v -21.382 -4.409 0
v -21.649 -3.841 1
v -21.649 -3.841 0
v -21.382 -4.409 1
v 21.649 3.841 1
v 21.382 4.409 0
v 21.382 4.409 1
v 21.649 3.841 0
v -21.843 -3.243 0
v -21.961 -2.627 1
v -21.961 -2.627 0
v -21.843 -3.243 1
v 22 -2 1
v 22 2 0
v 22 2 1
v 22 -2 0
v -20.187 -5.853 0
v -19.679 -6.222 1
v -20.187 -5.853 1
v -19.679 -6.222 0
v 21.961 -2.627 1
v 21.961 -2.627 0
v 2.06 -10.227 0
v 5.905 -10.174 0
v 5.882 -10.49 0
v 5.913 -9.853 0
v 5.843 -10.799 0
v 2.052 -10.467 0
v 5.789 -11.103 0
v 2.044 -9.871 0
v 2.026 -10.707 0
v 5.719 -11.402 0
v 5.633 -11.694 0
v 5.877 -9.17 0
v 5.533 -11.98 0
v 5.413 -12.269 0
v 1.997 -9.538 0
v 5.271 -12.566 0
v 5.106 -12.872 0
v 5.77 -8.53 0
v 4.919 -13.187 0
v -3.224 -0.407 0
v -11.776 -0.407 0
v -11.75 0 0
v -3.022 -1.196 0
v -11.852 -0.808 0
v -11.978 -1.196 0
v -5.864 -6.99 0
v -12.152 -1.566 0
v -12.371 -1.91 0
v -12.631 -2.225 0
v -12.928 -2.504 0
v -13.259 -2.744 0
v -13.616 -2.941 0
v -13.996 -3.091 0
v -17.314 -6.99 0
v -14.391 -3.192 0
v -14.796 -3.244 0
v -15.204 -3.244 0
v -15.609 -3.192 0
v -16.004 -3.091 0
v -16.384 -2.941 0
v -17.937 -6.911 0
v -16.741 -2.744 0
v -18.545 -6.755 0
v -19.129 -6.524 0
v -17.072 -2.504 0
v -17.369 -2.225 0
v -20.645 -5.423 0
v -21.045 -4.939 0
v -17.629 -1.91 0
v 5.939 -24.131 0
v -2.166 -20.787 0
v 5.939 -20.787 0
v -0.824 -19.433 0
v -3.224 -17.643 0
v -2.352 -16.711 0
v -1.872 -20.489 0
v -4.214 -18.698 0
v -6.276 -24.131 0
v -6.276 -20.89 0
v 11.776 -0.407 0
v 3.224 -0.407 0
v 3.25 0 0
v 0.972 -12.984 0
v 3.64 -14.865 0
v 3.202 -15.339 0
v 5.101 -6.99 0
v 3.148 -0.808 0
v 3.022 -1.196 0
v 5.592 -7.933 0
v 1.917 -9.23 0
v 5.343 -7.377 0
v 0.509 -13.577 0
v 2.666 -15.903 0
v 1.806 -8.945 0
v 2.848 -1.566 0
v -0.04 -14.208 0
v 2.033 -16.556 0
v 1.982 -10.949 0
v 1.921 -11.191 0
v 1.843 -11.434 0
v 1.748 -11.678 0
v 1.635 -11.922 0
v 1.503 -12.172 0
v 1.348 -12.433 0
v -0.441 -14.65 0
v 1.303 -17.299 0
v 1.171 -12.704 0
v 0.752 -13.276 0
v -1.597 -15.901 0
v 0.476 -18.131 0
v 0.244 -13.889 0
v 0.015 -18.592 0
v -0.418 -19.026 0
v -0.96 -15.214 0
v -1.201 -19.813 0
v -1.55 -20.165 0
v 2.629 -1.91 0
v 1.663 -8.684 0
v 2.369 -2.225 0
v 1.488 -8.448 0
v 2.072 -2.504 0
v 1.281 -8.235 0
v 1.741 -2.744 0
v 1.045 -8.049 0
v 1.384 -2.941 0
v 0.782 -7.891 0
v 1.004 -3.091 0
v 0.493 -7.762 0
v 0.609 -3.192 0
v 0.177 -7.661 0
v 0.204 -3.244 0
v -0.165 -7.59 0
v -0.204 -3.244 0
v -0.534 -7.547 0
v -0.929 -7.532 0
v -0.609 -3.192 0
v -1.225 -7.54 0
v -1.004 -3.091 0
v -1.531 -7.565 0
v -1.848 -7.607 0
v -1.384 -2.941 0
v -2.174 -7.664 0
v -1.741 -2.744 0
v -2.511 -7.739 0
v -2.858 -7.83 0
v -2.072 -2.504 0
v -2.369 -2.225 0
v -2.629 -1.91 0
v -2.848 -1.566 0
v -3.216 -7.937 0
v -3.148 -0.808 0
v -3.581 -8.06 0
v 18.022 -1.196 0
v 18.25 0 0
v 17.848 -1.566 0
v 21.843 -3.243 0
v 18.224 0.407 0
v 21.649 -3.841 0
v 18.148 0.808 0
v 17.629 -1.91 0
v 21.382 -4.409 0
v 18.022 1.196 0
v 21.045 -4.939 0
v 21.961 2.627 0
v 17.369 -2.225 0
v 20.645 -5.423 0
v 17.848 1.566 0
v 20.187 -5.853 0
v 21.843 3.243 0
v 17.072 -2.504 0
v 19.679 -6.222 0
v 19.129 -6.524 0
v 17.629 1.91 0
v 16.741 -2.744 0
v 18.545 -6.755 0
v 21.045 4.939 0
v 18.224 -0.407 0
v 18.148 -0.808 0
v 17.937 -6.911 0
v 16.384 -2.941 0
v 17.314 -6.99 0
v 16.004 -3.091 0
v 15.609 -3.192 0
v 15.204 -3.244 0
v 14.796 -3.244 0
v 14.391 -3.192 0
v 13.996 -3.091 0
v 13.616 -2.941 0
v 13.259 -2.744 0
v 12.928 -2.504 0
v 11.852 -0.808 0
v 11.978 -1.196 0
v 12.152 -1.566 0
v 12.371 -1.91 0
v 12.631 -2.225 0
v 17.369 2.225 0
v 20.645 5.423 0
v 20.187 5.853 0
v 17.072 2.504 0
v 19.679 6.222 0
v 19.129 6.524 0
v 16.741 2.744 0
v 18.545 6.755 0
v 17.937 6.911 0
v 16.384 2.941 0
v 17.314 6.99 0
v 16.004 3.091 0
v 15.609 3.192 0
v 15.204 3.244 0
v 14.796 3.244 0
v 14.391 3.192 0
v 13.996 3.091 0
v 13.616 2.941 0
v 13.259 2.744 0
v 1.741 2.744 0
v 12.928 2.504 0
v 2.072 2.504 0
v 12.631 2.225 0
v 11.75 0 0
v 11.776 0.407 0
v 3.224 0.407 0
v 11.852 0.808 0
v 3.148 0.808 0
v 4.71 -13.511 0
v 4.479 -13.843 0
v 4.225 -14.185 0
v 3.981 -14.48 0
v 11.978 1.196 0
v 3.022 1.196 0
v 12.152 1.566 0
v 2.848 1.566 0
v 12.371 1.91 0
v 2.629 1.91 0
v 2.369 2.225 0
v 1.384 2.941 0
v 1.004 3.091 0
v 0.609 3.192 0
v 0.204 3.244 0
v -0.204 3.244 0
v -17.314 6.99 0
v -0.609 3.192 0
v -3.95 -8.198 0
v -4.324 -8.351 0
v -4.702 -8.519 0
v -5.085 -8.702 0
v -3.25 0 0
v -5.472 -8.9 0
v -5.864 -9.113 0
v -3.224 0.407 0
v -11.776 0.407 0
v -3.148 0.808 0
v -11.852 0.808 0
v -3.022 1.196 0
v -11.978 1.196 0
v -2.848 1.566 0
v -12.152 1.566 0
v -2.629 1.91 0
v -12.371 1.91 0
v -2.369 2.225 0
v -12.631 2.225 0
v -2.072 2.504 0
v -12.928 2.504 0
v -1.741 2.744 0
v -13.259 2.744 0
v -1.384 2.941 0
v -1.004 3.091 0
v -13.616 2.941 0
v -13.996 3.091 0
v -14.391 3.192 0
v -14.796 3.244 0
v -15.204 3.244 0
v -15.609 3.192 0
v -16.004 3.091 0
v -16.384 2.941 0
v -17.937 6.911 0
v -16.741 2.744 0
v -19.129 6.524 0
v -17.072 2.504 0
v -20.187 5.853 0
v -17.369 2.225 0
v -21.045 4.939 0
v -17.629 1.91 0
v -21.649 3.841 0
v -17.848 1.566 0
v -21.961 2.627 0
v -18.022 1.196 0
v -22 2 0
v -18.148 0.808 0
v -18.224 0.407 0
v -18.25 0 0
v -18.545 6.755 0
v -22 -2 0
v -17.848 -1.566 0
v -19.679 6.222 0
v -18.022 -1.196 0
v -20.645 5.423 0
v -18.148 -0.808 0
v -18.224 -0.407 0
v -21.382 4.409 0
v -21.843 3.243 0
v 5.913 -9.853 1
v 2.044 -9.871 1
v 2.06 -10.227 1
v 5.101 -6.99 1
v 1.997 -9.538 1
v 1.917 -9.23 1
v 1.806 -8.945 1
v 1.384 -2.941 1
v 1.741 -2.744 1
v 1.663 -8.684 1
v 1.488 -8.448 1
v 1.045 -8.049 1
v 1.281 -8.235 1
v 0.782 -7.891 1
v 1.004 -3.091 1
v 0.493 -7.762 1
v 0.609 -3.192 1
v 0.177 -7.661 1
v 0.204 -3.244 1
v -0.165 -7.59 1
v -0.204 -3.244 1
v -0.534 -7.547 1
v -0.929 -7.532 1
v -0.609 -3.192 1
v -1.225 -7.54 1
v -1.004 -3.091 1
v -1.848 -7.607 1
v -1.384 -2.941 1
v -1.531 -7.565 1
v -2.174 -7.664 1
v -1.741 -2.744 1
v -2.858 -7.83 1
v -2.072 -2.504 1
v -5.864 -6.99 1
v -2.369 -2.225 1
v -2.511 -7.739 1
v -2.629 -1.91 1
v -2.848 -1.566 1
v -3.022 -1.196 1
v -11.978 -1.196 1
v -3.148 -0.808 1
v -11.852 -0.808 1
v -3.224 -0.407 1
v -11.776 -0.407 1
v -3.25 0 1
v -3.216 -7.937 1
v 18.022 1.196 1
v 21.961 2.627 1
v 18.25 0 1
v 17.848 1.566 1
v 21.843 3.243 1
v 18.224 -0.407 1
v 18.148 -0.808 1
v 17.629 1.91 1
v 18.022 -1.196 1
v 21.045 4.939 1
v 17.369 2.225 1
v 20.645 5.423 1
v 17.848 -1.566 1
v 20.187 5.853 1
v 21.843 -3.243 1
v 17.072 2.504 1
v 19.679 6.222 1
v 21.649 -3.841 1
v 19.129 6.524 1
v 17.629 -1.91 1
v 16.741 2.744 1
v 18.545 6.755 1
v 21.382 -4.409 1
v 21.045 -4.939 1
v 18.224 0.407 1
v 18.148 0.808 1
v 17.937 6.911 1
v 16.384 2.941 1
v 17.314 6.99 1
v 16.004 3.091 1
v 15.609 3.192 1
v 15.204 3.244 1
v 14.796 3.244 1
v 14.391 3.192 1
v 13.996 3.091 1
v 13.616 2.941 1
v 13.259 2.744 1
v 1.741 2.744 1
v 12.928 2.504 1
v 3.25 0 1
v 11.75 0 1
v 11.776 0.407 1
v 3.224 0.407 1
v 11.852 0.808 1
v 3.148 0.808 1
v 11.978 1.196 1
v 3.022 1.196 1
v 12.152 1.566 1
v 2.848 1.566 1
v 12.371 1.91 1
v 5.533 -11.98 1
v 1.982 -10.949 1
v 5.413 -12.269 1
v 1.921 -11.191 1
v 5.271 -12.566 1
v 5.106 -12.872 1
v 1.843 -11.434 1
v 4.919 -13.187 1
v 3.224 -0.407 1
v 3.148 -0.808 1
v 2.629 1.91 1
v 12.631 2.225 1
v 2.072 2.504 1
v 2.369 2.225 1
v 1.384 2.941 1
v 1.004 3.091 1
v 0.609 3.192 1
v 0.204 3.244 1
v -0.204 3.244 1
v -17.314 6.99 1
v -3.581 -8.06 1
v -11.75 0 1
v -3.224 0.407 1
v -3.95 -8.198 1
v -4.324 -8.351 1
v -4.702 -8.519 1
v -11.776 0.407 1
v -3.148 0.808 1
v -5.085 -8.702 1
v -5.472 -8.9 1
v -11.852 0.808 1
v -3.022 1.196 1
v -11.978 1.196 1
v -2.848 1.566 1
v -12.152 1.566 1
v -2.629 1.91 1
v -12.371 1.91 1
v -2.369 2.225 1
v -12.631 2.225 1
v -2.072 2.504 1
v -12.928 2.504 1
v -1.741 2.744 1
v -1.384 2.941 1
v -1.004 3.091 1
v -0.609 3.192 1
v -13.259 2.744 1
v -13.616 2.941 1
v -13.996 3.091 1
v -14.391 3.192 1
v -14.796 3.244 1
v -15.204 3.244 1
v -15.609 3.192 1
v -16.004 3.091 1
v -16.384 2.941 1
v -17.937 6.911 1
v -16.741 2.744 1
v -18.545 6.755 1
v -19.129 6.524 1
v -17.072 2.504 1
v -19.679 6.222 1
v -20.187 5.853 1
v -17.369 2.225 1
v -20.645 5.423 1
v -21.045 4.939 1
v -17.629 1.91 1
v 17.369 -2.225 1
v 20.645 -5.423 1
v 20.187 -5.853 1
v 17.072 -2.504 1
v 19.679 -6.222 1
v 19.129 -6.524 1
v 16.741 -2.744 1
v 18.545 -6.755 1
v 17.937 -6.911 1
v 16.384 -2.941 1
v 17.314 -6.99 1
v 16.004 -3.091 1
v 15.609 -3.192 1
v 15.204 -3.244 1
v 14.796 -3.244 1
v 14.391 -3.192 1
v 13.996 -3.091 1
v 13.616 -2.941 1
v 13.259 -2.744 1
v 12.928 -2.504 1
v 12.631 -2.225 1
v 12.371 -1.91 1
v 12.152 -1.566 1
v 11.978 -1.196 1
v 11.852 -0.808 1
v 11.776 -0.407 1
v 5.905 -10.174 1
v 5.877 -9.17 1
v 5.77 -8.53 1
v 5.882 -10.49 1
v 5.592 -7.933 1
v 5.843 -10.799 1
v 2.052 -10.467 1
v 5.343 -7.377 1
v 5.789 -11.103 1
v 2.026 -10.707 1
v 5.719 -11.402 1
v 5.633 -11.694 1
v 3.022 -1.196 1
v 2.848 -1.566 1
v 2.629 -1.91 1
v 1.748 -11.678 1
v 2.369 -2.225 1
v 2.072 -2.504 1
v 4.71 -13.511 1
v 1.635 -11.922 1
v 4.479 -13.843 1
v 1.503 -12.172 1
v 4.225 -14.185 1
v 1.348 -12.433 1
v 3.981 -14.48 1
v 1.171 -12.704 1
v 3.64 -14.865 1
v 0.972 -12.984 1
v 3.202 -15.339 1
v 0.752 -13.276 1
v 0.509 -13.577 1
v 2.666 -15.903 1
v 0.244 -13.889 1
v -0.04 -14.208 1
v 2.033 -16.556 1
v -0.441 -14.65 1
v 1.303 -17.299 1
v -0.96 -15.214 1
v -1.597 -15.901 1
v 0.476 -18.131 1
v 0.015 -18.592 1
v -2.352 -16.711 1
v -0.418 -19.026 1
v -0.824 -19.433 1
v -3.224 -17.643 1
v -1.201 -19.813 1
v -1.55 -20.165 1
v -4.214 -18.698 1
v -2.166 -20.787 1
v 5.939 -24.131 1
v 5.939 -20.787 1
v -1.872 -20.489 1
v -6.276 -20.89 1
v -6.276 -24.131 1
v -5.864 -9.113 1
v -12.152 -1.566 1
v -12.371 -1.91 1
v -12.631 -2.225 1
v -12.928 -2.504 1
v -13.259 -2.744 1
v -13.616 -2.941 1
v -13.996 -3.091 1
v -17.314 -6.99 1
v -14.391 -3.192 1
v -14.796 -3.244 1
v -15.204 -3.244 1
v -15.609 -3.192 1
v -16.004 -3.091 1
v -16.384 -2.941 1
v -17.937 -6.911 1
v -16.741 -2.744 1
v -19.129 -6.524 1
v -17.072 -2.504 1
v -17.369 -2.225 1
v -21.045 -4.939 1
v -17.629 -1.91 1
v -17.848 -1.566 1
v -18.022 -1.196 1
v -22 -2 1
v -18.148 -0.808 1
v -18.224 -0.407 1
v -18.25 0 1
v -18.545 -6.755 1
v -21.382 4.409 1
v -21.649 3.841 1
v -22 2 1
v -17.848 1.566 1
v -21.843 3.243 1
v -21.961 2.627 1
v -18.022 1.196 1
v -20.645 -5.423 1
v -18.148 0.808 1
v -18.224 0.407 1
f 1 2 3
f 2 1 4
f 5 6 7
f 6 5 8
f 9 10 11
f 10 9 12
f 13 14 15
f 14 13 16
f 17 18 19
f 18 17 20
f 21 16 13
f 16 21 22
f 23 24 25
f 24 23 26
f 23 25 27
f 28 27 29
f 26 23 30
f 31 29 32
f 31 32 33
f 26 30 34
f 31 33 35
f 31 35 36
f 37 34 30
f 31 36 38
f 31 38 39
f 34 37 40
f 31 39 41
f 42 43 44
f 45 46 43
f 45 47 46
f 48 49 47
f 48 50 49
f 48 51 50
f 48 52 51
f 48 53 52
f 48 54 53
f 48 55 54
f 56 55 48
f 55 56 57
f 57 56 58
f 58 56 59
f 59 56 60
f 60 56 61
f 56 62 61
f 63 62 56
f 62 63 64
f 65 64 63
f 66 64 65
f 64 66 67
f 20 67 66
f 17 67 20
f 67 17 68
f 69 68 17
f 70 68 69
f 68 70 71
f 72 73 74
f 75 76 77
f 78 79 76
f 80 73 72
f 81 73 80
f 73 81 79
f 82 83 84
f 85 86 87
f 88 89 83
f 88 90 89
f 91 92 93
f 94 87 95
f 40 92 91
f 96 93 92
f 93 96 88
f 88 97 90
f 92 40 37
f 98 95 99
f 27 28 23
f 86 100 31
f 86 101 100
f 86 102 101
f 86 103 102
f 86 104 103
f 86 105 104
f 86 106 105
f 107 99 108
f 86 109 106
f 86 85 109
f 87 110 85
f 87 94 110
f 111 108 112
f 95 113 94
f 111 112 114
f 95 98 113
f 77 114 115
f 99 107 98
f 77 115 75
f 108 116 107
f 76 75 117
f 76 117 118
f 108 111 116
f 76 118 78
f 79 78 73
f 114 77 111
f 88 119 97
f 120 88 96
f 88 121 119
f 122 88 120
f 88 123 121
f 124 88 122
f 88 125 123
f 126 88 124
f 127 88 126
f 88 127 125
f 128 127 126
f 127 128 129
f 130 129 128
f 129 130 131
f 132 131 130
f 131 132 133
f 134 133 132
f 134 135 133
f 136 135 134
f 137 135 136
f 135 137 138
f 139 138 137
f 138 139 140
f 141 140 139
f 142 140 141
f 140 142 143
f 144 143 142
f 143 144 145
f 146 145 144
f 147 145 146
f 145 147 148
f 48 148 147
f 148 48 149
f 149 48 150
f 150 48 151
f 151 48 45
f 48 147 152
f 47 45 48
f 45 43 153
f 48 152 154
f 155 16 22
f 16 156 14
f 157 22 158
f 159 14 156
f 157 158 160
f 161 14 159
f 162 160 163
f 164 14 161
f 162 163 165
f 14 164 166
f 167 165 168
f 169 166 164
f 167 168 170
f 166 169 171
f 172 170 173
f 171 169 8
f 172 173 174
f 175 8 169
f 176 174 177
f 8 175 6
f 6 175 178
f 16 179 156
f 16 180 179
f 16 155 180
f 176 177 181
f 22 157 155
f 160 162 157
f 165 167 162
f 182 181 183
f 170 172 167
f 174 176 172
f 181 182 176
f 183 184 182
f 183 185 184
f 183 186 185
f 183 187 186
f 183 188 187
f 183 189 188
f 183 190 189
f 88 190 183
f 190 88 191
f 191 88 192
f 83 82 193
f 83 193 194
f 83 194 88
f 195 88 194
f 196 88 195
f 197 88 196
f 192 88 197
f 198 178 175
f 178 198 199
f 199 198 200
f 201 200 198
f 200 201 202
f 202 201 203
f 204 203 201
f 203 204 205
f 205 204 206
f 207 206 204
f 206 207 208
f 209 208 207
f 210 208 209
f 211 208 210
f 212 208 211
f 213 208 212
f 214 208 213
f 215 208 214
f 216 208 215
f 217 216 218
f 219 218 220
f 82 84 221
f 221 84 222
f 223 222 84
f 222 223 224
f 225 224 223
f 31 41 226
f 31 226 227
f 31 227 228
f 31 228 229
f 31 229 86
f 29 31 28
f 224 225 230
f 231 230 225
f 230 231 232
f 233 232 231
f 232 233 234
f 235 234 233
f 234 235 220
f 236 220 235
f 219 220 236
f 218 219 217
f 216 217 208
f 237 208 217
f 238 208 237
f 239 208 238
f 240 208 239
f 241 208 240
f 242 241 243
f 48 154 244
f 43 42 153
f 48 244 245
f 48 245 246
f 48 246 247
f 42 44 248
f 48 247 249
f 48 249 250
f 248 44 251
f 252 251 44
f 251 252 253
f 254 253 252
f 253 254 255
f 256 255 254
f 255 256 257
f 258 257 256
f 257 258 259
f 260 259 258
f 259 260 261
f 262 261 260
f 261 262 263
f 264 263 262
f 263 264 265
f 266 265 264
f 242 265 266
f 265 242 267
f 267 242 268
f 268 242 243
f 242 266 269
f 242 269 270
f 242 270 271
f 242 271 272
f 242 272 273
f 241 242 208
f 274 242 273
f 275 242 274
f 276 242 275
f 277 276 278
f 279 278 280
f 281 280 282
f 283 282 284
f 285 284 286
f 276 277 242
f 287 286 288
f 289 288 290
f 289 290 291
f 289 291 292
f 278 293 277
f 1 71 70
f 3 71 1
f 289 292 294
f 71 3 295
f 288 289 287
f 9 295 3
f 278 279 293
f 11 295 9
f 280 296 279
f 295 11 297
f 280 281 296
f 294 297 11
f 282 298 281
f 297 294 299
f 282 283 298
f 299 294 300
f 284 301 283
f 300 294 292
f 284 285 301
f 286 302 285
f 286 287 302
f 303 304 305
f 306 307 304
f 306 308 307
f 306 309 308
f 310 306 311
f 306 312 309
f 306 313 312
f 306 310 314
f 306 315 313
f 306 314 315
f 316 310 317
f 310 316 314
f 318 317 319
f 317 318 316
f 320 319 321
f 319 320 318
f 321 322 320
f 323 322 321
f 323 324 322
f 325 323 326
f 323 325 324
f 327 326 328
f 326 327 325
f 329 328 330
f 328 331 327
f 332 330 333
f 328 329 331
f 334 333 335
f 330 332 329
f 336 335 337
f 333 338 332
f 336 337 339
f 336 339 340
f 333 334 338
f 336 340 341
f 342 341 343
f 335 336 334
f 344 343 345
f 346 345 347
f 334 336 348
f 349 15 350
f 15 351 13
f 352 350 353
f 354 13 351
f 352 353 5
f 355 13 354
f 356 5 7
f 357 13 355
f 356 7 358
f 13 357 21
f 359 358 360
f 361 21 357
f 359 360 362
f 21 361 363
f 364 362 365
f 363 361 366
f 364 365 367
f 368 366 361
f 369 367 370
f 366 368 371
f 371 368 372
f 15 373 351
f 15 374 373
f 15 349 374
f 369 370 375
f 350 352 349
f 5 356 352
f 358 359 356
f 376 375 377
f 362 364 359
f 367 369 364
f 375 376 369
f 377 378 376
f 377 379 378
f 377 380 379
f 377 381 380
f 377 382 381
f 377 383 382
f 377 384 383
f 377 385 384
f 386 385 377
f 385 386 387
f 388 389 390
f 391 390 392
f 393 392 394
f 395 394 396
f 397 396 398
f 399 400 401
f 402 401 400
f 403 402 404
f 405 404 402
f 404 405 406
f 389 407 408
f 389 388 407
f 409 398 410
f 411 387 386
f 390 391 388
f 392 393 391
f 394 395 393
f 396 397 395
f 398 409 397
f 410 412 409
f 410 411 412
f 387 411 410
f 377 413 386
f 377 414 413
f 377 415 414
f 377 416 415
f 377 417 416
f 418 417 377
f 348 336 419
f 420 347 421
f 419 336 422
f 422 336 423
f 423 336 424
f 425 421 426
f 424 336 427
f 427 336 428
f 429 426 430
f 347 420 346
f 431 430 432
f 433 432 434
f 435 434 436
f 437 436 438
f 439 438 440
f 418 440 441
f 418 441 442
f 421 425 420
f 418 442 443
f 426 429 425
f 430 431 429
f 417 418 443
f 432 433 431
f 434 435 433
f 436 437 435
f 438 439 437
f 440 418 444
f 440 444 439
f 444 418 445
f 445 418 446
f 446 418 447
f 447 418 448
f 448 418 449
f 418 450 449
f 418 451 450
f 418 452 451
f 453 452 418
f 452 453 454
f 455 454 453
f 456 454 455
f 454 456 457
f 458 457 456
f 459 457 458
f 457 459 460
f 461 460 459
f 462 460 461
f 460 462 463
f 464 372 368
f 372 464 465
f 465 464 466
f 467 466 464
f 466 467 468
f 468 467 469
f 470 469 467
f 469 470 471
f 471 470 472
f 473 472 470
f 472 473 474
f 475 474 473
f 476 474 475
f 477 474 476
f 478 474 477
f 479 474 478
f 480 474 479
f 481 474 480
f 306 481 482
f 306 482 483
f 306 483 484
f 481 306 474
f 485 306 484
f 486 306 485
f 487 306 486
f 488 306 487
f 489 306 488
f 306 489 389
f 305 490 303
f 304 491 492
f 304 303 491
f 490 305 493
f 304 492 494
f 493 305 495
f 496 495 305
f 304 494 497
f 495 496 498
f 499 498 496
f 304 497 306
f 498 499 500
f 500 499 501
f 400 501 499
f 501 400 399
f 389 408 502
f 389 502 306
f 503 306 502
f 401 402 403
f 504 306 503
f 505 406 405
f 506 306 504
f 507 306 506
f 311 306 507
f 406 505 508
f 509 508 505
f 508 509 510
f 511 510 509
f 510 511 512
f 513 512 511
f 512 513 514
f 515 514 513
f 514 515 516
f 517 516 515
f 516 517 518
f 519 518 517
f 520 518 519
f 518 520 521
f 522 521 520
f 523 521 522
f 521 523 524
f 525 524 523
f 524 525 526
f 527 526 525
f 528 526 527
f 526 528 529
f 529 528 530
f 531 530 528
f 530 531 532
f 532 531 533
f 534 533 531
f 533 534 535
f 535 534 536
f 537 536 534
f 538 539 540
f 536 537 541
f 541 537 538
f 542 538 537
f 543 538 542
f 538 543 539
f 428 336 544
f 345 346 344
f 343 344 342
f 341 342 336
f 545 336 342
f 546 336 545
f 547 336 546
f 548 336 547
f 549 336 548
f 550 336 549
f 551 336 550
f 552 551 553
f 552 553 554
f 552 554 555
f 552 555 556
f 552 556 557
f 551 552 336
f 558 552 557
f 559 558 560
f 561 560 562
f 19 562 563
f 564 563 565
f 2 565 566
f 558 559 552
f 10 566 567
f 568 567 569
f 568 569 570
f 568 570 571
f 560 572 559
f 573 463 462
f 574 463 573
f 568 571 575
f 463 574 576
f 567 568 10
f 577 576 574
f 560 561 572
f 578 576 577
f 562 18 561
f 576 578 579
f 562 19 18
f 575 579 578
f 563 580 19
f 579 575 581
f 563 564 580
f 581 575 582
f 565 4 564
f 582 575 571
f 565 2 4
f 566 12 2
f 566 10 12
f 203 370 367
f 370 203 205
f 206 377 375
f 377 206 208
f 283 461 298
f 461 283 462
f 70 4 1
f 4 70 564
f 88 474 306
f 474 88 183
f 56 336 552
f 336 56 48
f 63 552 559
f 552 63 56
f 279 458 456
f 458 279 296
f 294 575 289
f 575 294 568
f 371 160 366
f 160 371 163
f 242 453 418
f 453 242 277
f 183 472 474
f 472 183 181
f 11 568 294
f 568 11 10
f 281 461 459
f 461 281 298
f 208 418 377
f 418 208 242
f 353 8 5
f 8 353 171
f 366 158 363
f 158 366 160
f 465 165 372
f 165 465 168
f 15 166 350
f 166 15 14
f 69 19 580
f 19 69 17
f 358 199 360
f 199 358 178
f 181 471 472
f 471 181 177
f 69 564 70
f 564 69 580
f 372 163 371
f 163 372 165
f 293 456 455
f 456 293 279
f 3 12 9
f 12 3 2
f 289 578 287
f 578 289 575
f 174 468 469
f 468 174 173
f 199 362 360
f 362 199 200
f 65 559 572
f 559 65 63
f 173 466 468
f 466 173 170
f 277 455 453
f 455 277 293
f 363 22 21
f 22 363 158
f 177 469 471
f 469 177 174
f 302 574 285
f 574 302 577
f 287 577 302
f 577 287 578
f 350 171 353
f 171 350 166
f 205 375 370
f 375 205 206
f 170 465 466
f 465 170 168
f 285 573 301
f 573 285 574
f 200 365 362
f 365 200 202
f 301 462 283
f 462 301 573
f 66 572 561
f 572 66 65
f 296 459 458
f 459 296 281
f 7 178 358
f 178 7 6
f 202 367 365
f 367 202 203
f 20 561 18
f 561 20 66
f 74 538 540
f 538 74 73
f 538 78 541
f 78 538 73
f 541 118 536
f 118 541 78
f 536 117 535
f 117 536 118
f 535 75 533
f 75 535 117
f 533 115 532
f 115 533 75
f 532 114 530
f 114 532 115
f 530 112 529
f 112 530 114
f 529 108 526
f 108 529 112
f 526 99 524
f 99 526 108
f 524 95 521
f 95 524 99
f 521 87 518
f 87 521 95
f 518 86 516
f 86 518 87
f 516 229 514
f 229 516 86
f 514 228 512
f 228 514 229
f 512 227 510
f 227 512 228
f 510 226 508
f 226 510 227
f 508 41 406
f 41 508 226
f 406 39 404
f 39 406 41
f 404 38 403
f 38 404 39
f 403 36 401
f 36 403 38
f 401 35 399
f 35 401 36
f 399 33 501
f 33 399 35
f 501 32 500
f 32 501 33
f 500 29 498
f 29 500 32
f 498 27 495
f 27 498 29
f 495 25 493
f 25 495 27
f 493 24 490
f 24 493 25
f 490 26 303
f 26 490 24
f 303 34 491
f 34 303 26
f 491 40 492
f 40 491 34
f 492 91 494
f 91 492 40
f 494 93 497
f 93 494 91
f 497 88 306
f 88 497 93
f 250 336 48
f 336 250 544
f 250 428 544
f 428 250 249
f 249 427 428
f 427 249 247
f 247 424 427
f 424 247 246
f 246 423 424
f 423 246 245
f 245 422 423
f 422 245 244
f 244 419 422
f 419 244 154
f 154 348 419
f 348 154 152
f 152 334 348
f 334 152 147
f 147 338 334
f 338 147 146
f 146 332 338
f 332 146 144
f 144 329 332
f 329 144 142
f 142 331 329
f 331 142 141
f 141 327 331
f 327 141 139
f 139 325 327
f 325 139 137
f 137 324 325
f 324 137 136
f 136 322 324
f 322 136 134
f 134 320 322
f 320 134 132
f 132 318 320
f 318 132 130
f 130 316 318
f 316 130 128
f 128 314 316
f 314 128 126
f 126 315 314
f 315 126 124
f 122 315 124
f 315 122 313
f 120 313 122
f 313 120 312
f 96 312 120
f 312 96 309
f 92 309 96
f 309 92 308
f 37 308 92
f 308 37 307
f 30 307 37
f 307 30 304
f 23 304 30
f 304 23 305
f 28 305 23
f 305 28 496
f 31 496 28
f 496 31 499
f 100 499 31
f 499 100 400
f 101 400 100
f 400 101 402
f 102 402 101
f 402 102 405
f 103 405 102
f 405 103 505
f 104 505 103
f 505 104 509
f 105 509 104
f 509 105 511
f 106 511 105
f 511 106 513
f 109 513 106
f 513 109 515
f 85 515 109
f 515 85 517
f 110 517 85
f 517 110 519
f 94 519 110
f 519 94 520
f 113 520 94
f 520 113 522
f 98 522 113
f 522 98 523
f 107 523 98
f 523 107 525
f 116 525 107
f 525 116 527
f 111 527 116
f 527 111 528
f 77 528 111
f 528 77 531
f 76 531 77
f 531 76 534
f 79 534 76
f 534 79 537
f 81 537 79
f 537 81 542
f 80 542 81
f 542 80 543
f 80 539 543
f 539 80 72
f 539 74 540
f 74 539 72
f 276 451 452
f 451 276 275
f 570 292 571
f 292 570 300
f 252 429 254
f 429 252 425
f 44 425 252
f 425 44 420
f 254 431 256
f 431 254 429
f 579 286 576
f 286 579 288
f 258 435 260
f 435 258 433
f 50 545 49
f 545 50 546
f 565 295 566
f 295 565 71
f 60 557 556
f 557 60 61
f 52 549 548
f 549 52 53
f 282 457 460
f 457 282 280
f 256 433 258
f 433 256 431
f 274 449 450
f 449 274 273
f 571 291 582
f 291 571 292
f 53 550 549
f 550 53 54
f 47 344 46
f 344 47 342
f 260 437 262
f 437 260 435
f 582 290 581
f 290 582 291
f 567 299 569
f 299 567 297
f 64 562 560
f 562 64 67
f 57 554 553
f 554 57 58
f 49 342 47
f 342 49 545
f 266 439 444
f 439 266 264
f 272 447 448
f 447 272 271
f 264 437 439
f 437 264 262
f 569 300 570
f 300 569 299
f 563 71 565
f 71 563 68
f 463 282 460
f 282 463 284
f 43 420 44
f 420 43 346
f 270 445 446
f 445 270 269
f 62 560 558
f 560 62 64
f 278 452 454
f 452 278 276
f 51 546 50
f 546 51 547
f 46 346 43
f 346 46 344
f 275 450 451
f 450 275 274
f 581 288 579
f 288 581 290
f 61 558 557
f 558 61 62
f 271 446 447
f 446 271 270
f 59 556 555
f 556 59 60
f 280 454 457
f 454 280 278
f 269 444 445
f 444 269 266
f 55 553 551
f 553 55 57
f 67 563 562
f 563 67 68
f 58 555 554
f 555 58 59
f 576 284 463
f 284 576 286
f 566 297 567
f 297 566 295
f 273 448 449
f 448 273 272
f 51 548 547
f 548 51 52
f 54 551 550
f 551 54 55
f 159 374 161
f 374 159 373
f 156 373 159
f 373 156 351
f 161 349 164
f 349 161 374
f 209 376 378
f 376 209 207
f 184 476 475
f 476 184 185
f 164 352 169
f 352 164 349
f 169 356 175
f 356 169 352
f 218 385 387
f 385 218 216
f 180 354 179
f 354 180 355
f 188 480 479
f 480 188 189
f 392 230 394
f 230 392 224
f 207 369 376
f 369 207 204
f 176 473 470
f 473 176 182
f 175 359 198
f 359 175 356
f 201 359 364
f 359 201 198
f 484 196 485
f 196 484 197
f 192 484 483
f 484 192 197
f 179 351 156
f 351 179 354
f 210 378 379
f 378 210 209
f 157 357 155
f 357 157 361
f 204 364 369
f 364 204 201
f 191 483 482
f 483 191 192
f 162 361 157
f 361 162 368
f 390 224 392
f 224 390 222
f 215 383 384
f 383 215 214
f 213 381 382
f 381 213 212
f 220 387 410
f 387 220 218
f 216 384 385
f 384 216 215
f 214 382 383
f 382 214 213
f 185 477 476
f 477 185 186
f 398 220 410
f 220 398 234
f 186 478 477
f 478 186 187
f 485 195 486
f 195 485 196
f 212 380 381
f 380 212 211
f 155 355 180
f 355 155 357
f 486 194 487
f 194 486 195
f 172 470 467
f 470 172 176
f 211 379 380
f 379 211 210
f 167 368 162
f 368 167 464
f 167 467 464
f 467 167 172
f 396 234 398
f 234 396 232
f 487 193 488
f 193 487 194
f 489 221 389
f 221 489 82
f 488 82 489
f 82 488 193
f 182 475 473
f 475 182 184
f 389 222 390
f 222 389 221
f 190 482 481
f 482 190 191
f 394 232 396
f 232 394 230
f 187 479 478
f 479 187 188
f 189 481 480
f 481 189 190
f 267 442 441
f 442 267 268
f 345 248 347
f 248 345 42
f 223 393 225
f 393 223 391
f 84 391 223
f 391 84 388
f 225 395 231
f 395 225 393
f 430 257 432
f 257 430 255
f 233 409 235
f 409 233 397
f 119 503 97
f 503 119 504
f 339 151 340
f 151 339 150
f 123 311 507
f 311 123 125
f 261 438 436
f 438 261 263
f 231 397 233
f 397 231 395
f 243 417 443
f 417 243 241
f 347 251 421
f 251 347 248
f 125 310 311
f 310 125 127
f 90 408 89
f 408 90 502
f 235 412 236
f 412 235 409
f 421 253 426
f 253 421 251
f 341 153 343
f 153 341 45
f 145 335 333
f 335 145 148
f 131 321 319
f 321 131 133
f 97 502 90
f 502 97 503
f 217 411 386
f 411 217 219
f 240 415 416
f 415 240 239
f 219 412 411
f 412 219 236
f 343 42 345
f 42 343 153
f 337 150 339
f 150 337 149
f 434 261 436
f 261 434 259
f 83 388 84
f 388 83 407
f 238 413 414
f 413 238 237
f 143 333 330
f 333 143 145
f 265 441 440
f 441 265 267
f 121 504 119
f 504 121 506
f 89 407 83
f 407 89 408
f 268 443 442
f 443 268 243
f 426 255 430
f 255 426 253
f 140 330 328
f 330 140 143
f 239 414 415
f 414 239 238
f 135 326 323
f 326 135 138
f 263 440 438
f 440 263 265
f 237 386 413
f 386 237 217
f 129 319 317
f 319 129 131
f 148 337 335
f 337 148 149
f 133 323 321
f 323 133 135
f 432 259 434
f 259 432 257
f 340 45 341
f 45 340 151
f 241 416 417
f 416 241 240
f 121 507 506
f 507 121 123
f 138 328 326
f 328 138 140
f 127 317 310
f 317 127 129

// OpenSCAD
$fn = 50;


difference() {
	union() {
		translate(v = [0, 0, 0]) {
			rotate(a = [0, 0, 0]) {
				hull() {
					translate(v = [-17.0000000000, 2.0000000000, 0]) {
						rotate(a = [0, 0, 0]) {
							translate(v = [0, 0, 0]) {
								rotate(a = [0, 0, 0]) {
									cylinder(h = 1, r = 5);
								}
							}
						}
					}
					translate(v = [17.0000000000, 2.0000000000, 0]) {
						rotate(a = [0, 0, 0]) {
							translate(v = [0, 0, 0]) {
								rotate(a = [0, 0, 0]) {
									cylinder(h = 1, r = 5);
								}
							}
						}
					}
					translate(v = [-17.0000000000, -2.0000000000, 0]) {
						rotate(a = [0, 0, 0]) {
							translate(v = [0, 0, 0]) {
								rotate(a = [0, 0, 0]) {
									cylinder(h = 1, r = 5);
								}
							}
						}
					}
					translate(v = [17.0000000000, -2.0000000000, 0]) {
						rotate(a = [0, 0, 0]) {
							translate(v = [0, 0, 0]) {
								rotate(a = [0, 0, 0]) {
									cylinder(h = 1, r = 5);
								}
							}
						}
					}
				}
			}
		}
		translate(v = [0, -5, 0]) {
			rotate(a = [0, 0, 0]) {
				linear_extrude(height = 1) {
					text(font = "DejaVu Sans Mono:style=Bold", halign = "center", size = 19.0000000000, text = "2", valign = "top");
				}
			}
		}
	}
	union() {
		translate(v = [-15.0000000000, 0.0000000000, -125.0000000000]) {
			rotate(a = [0, 0, 0]) {
				cylinder(h = 250, r = 3.2500000000);
			}
		}
		translate(v = [15.0000000000, 0.0000000000, -125.0000000000]) {
			rotate(a = [0, 0, 0]) {
				cylinder(h = 250, r = 3.2500000000);
			}
		}
		translate(v = [15.0000000000, 0.0000000000, -125.0000000000]) {
			rotate(a = [0, 0, 0]) {
				cylinder(h = 250, r = 3.2500000000);
			}
		}
		translate(v = [0, 0, -125.0000000000]) {
			rotate(a = [0, 0, 0]) {
				cylinder(h = 250, r = 3.2500000000);
			}
		}
	}
}
